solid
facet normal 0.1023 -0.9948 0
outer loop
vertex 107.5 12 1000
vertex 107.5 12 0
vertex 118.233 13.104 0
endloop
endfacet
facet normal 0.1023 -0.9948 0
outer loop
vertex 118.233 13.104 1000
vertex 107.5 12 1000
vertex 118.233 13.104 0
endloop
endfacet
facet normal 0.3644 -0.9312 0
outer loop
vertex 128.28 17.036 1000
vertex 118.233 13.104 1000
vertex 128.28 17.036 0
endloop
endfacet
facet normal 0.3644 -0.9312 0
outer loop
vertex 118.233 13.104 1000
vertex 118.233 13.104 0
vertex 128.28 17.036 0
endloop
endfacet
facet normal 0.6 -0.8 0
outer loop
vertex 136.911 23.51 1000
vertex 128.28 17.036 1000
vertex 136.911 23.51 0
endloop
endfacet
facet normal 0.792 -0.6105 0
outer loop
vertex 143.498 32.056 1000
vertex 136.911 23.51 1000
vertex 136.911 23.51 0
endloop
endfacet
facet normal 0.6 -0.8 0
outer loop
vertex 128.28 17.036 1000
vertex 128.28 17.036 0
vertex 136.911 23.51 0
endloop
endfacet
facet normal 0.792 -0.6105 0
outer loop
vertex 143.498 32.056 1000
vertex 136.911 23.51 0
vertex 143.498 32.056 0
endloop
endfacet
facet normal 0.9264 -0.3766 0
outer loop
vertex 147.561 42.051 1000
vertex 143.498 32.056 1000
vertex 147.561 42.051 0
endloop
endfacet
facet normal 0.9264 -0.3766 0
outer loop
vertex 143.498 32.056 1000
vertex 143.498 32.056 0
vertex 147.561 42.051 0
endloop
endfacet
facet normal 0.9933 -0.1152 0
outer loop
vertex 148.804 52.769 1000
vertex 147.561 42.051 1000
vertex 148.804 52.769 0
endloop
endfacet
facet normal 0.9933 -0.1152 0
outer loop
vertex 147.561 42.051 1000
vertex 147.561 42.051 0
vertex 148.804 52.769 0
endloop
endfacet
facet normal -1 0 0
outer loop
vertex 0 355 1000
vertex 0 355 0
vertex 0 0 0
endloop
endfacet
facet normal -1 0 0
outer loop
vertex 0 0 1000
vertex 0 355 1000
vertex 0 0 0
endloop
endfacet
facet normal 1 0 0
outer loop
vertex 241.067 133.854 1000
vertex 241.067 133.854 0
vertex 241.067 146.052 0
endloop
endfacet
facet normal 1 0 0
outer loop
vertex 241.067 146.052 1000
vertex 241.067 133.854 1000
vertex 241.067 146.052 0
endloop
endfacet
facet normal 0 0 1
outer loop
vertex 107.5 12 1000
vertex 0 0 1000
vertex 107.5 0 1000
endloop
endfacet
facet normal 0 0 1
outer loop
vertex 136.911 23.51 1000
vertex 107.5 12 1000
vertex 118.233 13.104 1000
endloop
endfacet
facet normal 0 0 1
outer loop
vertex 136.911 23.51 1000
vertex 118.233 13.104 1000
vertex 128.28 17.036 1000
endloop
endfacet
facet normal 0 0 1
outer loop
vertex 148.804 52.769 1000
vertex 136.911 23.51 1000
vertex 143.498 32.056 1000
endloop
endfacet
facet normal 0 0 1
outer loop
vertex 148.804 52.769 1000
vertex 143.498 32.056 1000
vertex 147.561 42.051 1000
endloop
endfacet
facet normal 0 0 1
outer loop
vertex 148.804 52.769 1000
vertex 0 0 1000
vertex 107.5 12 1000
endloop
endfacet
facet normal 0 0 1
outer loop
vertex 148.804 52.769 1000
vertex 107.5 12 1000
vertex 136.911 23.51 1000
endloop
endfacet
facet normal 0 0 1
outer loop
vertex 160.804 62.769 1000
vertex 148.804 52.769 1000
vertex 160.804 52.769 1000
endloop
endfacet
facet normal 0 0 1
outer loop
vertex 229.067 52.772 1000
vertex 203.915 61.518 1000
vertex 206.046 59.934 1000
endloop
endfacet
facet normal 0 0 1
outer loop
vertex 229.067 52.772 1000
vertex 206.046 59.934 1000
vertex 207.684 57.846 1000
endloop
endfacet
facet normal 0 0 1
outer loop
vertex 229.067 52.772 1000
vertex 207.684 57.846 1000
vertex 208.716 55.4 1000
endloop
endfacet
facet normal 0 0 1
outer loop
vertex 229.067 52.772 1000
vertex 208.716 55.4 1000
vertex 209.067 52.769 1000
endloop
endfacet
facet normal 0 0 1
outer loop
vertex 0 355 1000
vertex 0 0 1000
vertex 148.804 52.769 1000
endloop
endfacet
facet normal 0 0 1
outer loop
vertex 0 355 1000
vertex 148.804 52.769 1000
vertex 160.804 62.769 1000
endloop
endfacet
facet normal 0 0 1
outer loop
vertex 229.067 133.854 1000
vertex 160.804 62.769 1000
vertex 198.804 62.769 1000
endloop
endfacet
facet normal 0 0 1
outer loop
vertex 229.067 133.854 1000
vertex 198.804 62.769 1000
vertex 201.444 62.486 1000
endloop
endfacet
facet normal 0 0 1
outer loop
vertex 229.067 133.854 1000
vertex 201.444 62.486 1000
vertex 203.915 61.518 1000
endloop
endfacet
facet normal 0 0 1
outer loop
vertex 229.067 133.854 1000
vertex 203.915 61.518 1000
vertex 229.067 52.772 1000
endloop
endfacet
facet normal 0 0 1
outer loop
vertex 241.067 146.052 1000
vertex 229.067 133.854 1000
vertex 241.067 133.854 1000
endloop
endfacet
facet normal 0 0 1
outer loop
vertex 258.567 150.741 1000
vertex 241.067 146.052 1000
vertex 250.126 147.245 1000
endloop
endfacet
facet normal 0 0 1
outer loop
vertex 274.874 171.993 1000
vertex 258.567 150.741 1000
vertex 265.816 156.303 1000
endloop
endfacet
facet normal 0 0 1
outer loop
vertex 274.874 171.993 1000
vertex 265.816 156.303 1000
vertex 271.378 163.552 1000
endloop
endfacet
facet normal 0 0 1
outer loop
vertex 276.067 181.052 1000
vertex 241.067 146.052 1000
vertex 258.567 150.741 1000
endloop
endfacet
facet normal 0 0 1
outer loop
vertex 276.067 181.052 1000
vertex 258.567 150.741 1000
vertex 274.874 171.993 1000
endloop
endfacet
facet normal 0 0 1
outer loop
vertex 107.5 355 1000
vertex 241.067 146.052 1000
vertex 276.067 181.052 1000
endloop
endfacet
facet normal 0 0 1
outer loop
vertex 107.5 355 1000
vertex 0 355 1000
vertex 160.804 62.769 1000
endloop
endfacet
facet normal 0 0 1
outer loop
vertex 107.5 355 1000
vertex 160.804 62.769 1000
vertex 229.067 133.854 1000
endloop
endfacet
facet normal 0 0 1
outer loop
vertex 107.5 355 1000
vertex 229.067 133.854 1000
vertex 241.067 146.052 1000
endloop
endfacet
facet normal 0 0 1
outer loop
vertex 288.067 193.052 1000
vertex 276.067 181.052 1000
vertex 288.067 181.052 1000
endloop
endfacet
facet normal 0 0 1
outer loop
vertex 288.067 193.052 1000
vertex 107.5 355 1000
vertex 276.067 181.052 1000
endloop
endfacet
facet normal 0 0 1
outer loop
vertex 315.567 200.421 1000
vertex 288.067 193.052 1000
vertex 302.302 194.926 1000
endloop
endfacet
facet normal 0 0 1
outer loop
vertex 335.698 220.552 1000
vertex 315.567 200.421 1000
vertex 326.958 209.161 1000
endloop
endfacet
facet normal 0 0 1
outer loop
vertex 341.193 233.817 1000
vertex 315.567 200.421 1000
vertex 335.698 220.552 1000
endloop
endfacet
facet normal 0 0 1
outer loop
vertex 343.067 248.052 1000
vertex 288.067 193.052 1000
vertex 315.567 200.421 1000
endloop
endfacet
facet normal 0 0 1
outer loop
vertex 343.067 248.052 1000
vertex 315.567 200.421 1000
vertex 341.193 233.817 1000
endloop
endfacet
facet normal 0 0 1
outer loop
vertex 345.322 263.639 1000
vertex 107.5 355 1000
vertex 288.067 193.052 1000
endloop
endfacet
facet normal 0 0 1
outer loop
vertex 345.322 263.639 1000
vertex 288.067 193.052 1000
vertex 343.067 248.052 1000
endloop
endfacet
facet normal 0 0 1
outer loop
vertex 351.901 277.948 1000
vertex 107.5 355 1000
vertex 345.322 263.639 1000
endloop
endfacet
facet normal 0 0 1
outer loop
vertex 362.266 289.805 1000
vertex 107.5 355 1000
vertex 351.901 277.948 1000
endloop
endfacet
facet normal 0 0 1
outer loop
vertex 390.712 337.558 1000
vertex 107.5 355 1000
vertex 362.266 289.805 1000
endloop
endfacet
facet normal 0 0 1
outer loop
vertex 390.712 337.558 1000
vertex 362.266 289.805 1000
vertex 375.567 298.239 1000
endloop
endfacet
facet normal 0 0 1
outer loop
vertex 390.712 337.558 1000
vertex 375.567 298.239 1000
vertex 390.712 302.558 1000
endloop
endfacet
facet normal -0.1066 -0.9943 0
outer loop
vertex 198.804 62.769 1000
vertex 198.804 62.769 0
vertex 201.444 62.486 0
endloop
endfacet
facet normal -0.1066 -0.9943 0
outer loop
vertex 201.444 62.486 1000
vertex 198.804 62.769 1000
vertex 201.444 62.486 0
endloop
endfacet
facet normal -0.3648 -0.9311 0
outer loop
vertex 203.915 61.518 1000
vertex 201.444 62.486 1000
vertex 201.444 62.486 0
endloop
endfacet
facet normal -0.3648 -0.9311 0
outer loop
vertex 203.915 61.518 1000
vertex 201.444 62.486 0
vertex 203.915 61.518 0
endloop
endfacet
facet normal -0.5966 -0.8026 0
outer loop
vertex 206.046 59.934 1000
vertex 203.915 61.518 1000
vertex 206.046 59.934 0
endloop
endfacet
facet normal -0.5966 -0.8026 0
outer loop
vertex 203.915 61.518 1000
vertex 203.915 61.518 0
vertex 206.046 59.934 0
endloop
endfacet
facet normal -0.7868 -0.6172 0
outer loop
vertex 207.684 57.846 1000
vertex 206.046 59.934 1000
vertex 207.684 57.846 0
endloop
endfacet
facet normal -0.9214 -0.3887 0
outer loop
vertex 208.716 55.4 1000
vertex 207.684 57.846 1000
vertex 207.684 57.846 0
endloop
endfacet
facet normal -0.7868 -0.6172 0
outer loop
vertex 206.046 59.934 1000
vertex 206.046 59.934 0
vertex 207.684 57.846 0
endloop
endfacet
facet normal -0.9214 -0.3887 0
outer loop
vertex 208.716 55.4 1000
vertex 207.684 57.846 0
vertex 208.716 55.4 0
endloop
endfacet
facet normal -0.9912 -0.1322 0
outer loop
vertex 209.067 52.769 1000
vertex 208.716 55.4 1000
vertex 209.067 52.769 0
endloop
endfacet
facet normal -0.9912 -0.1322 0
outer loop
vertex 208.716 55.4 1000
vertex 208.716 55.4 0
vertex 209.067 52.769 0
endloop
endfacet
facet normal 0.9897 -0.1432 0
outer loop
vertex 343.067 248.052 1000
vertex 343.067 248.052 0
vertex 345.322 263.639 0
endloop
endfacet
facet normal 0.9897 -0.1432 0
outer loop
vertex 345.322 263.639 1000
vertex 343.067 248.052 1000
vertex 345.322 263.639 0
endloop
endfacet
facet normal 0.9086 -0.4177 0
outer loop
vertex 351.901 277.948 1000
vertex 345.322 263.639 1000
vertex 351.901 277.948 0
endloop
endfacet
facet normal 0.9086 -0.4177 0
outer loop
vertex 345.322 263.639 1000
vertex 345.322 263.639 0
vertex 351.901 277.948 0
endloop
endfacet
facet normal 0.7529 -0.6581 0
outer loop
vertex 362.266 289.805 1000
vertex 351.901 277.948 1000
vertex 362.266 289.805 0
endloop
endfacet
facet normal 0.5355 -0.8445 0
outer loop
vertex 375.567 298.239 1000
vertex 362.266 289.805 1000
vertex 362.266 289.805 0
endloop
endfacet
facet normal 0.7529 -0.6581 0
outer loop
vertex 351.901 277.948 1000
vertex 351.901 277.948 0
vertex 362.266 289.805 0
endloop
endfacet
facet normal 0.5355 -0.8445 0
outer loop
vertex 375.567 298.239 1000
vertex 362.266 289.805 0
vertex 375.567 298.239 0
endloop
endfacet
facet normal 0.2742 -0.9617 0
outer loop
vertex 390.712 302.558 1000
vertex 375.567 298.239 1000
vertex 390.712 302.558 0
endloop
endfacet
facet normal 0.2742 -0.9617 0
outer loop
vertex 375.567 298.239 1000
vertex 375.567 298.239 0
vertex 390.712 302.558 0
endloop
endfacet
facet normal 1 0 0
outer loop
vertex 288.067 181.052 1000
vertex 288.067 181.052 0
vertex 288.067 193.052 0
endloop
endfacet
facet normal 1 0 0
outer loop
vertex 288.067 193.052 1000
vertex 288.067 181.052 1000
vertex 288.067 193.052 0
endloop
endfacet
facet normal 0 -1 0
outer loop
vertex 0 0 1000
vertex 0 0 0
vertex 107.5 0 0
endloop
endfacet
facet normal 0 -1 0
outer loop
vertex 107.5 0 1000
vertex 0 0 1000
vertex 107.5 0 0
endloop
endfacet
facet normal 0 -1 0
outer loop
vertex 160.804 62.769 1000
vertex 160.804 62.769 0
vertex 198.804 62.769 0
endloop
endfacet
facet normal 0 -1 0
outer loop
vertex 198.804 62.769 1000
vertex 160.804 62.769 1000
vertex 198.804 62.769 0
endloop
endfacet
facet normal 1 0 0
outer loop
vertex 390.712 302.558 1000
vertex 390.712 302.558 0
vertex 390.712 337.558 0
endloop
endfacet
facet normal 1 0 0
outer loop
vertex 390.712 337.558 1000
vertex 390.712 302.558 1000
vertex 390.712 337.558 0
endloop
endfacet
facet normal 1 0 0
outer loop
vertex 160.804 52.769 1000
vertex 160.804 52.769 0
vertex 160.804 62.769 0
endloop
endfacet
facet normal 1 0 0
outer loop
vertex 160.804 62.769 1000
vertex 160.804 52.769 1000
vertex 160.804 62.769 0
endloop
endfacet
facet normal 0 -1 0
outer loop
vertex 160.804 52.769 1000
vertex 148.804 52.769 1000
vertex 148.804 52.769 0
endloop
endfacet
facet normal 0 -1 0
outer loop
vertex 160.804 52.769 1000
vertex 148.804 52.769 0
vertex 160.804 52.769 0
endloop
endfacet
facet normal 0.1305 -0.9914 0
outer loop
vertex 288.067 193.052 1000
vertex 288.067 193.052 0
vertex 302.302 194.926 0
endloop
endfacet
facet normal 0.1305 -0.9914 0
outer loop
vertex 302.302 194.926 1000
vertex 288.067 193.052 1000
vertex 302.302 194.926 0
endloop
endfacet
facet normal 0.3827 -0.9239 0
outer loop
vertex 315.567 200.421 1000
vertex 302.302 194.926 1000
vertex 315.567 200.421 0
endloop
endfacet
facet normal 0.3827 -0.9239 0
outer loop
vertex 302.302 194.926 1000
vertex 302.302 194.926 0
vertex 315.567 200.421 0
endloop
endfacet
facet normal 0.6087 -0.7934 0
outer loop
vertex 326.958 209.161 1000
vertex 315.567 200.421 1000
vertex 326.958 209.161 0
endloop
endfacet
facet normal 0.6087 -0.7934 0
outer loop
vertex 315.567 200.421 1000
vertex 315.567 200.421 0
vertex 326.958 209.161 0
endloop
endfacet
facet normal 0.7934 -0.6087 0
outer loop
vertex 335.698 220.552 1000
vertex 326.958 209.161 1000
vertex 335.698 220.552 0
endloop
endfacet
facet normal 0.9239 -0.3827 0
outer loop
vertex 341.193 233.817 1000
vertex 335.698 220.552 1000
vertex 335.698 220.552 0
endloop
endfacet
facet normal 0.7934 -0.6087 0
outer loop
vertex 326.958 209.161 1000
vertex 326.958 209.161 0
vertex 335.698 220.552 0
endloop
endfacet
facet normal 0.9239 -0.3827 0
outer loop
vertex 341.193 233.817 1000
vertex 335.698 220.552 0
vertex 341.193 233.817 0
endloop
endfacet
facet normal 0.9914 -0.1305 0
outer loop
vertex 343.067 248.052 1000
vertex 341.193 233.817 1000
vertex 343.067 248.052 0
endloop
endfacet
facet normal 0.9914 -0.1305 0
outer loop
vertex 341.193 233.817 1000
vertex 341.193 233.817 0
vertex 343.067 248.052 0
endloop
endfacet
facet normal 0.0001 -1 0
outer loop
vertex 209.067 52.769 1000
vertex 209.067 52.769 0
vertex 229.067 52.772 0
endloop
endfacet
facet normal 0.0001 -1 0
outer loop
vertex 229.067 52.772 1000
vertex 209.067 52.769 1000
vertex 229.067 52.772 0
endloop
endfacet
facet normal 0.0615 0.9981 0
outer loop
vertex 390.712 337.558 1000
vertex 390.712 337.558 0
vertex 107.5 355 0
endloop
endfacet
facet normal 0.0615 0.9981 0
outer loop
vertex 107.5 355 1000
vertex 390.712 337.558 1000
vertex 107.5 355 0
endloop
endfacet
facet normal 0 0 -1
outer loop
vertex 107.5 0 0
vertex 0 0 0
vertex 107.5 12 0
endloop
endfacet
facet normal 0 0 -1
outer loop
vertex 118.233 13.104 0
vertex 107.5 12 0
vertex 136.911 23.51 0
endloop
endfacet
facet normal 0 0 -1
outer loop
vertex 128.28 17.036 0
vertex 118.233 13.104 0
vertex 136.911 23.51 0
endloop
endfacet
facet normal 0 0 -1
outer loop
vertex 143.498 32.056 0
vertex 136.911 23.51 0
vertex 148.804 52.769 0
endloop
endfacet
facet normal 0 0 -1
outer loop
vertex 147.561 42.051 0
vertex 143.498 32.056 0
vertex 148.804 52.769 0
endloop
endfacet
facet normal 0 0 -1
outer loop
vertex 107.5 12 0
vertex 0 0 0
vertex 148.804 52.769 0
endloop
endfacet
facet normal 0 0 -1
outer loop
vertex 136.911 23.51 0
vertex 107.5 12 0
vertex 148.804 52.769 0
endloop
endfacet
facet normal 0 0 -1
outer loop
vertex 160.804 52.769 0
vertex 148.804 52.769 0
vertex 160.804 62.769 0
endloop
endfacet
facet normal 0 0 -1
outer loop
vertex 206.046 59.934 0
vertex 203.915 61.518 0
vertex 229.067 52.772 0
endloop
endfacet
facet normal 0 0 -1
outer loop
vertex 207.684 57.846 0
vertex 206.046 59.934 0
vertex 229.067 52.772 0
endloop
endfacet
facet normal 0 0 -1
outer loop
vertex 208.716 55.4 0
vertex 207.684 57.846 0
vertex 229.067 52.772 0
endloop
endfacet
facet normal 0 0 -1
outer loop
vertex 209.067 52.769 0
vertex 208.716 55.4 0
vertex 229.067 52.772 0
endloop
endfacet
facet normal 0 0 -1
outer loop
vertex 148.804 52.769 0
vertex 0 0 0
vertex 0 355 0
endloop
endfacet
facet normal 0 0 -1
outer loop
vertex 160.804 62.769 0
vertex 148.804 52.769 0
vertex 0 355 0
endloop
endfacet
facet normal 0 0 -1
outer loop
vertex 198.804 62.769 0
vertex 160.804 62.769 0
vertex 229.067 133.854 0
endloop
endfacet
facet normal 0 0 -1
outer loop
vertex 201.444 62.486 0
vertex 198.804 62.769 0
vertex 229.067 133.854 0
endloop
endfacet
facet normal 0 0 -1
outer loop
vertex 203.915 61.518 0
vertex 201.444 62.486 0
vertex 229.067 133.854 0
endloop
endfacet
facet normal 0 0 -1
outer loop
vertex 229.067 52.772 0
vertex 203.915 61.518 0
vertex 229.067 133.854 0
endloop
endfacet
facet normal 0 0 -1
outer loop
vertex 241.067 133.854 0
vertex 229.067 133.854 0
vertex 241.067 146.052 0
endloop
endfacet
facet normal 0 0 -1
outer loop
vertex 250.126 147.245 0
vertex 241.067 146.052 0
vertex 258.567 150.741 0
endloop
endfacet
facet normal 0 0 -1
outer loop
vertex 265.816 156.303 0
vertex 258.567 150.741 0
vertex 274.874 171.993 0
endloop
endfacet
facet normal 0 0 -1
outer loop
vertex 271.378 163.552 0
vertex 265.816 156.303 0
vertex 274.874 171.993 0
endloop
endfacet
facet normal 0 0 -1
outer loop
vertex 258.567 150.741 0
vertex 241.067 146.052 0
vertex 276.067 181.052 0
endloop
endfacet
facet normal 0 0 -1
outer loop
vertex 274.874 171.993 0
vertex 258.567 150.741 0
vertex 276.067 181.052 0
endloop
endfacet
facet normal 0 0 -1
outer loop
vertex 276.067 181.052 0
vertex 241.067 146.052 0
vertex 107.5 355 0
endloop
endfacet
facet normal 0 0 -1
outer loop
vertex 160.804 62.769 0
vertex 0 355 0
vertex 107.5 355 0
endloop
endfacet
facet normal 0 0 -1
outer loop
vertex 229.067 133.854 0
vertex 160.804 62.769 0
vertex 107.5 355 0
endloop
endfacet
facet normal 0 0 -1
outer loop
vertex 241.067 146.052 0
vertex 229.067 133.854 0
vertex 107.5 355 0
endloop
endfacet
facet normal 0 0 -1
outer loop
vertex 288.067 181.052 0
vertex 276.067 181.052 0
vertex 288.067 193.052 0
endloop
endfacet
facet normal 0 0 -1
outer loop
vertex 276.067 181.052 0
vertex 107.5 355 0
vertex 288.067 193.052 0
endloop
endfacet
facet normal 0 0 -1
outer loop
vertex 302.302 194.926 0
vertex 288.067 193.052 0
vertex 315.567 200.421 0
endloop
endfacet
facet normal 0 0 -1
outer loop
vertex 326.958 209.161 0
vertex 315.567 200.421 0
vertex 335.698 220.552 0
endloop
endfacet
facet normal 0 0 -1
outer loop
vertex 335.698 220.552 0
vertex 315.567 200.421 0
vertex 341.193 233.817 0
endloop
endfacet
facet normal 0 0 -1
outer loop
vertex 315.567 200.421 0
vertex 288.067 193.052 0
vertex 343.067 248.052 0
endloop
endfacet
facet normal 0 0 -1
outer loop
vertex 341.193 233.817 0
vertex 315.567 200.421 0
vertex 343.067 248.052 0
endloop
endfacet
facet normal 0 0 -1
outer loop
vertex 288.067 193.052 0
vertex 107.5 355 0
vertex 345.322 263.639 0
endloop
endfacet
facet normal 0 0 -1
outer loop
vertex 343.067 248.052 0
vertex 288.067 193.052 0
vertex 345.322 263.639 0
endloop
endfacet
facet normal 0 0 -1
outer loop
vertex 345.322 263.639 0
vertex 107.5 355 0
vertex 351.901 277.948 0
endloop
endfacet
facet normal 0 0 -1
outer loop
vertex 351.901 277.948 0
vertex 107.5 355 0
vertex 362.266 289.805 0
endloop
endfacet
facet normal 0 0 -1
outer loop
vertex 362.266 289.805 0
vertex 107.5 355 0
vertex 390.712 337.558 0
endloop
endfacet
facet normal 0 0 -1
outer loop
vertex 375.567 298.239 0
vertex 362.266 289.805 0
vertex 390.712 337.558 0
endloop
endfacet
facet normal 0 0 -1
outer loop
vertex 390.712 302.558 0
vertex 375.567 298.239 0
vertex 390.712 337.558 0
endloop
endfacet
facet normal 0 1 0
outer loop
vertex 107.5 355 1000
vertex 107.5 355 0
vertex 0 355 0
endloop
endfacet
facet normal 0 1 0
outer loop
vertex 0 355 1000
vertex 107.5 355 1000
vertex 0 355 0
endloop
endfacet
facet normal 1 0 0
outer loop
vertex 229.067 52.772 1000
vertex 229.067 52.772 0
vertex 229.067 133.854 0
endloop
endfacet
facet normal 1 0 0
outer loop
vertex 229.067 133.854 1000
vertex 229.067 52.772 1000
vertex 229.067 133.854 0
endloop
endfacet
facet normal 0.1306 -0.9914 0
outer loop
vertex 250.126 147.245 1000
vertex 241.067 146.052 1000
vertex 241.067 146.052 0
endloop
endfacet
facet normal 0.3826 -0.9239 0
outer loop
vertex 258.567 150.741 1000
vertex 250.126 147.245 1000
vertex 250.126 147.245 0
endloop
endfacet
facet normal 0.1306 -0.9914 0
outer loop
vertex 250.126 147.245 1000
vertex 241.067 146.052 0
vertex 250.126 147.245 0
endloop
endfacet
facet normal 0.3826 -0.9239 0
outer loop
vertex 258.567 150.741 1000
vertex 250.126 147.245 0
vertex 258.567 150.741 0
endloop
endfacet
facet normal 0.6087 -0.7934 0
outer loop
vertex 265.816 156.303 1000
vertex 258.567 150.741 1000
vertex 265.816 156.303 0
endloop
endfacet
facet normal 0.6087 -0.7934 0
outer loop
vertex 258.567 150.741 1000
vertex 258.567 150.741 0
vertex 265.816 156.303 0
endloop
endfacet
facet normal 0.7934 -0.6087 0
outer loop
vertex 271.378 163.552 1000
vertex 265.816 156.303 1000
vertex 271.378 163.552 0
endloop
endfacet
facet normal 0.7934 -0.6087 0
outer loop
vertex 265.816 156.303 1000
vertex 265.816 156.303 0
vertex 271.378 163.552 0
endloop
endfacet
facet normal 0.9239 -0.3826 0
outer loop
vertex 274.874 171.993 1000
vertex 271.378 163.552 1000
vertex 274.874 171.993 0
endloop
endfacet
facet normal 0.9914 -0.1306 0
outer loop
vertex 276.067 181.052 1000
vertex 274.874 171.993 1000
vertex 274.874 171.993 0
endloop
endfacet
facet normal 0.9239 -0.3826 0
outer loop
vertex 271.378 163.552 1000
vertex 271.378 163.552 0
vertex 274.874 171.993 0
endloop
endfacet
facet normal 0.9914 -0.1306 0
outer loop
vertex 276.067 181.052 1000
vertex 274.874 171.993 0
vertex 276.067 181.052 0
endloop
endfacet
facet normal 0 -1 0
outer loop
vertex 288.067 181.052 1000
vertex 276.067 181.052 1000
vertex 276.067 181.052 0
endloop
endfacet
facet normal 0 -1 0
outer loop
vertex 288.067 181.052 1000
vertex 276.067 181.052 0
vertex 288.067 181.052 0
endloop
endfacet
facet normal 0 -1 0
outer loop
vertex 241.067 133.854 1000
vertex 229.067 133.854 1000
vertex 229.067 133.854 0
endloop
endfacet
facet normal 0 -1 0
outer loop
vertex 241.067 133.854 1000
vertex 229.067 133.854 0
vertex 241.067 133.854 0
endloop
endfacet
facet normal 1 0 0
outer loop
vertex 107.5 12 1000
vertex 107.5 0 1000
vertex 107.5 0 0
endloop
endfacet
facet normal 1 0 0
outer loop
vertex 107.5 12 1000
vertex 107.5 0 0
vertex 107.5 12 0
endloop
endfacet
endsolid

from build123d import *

# Parameters (mm, degrees)
F1_DEPTH = 1000


with BuildPart() as f1:
    # F0 (on Top) → F1 (new body)
    with BuildSketch(Plane.XY):
        with BuildLine():
            Line((0, 355), (0, 0))
            Line((0, 0), (107.5, 0))
            Line((107.5, 0), (107.5, 12))
            ThreePointArc((107.5, 12), (136.911107, 23.510225), (148.804216, 52.7686))
            Line((148.804216, 52.7686), (160.804216, 52.7686))
            Line((160.804216, 52.7686), (160.804216, 62.7686))
            Line((160.804216, 62.7686), (198.804216, 62.7686))
            ThreePointArc((198.804216, 62.7686), (206.045742, 59.934201), (209.066943, 52.7686))
            Line((209.066943, 52.7686), (229.066943, 52.771947))
            Line((229.066943, 52.771947), (229.066943, 133.853948))
            Line((229.066943, 133.853948), (241.066943, 133.853948))
            Line((241.066943, 133.853948), (241.066943, 146.052128))
            ThreePointArc((241.066943, 146.052128), (265.815681, 156.303391), (276.066943, 181.052128))
            Line((276.066943, 181.052128), (288.066943, 181.052128))
            Line((288.066943, 181.052128), (288.066943, 193.052128))
            ThreePointArc((288.066943, 193.052128), (326.957816, 209.161255), (343.066943, 248.052128))
            ThreePointArc((343.066943, 248.052128), (356.657186, 284.249256), (390.711745, 302.558101))
            Line((390.711745, 302.558101), (390.711745, 337.558101))
            Line((390.711745, 337.558101), (107.5, 355))
            Line((107.5, 355), (0, 355))
        make_face()
    extrude(amount=F1_DEPTH)


solid = f1.part
